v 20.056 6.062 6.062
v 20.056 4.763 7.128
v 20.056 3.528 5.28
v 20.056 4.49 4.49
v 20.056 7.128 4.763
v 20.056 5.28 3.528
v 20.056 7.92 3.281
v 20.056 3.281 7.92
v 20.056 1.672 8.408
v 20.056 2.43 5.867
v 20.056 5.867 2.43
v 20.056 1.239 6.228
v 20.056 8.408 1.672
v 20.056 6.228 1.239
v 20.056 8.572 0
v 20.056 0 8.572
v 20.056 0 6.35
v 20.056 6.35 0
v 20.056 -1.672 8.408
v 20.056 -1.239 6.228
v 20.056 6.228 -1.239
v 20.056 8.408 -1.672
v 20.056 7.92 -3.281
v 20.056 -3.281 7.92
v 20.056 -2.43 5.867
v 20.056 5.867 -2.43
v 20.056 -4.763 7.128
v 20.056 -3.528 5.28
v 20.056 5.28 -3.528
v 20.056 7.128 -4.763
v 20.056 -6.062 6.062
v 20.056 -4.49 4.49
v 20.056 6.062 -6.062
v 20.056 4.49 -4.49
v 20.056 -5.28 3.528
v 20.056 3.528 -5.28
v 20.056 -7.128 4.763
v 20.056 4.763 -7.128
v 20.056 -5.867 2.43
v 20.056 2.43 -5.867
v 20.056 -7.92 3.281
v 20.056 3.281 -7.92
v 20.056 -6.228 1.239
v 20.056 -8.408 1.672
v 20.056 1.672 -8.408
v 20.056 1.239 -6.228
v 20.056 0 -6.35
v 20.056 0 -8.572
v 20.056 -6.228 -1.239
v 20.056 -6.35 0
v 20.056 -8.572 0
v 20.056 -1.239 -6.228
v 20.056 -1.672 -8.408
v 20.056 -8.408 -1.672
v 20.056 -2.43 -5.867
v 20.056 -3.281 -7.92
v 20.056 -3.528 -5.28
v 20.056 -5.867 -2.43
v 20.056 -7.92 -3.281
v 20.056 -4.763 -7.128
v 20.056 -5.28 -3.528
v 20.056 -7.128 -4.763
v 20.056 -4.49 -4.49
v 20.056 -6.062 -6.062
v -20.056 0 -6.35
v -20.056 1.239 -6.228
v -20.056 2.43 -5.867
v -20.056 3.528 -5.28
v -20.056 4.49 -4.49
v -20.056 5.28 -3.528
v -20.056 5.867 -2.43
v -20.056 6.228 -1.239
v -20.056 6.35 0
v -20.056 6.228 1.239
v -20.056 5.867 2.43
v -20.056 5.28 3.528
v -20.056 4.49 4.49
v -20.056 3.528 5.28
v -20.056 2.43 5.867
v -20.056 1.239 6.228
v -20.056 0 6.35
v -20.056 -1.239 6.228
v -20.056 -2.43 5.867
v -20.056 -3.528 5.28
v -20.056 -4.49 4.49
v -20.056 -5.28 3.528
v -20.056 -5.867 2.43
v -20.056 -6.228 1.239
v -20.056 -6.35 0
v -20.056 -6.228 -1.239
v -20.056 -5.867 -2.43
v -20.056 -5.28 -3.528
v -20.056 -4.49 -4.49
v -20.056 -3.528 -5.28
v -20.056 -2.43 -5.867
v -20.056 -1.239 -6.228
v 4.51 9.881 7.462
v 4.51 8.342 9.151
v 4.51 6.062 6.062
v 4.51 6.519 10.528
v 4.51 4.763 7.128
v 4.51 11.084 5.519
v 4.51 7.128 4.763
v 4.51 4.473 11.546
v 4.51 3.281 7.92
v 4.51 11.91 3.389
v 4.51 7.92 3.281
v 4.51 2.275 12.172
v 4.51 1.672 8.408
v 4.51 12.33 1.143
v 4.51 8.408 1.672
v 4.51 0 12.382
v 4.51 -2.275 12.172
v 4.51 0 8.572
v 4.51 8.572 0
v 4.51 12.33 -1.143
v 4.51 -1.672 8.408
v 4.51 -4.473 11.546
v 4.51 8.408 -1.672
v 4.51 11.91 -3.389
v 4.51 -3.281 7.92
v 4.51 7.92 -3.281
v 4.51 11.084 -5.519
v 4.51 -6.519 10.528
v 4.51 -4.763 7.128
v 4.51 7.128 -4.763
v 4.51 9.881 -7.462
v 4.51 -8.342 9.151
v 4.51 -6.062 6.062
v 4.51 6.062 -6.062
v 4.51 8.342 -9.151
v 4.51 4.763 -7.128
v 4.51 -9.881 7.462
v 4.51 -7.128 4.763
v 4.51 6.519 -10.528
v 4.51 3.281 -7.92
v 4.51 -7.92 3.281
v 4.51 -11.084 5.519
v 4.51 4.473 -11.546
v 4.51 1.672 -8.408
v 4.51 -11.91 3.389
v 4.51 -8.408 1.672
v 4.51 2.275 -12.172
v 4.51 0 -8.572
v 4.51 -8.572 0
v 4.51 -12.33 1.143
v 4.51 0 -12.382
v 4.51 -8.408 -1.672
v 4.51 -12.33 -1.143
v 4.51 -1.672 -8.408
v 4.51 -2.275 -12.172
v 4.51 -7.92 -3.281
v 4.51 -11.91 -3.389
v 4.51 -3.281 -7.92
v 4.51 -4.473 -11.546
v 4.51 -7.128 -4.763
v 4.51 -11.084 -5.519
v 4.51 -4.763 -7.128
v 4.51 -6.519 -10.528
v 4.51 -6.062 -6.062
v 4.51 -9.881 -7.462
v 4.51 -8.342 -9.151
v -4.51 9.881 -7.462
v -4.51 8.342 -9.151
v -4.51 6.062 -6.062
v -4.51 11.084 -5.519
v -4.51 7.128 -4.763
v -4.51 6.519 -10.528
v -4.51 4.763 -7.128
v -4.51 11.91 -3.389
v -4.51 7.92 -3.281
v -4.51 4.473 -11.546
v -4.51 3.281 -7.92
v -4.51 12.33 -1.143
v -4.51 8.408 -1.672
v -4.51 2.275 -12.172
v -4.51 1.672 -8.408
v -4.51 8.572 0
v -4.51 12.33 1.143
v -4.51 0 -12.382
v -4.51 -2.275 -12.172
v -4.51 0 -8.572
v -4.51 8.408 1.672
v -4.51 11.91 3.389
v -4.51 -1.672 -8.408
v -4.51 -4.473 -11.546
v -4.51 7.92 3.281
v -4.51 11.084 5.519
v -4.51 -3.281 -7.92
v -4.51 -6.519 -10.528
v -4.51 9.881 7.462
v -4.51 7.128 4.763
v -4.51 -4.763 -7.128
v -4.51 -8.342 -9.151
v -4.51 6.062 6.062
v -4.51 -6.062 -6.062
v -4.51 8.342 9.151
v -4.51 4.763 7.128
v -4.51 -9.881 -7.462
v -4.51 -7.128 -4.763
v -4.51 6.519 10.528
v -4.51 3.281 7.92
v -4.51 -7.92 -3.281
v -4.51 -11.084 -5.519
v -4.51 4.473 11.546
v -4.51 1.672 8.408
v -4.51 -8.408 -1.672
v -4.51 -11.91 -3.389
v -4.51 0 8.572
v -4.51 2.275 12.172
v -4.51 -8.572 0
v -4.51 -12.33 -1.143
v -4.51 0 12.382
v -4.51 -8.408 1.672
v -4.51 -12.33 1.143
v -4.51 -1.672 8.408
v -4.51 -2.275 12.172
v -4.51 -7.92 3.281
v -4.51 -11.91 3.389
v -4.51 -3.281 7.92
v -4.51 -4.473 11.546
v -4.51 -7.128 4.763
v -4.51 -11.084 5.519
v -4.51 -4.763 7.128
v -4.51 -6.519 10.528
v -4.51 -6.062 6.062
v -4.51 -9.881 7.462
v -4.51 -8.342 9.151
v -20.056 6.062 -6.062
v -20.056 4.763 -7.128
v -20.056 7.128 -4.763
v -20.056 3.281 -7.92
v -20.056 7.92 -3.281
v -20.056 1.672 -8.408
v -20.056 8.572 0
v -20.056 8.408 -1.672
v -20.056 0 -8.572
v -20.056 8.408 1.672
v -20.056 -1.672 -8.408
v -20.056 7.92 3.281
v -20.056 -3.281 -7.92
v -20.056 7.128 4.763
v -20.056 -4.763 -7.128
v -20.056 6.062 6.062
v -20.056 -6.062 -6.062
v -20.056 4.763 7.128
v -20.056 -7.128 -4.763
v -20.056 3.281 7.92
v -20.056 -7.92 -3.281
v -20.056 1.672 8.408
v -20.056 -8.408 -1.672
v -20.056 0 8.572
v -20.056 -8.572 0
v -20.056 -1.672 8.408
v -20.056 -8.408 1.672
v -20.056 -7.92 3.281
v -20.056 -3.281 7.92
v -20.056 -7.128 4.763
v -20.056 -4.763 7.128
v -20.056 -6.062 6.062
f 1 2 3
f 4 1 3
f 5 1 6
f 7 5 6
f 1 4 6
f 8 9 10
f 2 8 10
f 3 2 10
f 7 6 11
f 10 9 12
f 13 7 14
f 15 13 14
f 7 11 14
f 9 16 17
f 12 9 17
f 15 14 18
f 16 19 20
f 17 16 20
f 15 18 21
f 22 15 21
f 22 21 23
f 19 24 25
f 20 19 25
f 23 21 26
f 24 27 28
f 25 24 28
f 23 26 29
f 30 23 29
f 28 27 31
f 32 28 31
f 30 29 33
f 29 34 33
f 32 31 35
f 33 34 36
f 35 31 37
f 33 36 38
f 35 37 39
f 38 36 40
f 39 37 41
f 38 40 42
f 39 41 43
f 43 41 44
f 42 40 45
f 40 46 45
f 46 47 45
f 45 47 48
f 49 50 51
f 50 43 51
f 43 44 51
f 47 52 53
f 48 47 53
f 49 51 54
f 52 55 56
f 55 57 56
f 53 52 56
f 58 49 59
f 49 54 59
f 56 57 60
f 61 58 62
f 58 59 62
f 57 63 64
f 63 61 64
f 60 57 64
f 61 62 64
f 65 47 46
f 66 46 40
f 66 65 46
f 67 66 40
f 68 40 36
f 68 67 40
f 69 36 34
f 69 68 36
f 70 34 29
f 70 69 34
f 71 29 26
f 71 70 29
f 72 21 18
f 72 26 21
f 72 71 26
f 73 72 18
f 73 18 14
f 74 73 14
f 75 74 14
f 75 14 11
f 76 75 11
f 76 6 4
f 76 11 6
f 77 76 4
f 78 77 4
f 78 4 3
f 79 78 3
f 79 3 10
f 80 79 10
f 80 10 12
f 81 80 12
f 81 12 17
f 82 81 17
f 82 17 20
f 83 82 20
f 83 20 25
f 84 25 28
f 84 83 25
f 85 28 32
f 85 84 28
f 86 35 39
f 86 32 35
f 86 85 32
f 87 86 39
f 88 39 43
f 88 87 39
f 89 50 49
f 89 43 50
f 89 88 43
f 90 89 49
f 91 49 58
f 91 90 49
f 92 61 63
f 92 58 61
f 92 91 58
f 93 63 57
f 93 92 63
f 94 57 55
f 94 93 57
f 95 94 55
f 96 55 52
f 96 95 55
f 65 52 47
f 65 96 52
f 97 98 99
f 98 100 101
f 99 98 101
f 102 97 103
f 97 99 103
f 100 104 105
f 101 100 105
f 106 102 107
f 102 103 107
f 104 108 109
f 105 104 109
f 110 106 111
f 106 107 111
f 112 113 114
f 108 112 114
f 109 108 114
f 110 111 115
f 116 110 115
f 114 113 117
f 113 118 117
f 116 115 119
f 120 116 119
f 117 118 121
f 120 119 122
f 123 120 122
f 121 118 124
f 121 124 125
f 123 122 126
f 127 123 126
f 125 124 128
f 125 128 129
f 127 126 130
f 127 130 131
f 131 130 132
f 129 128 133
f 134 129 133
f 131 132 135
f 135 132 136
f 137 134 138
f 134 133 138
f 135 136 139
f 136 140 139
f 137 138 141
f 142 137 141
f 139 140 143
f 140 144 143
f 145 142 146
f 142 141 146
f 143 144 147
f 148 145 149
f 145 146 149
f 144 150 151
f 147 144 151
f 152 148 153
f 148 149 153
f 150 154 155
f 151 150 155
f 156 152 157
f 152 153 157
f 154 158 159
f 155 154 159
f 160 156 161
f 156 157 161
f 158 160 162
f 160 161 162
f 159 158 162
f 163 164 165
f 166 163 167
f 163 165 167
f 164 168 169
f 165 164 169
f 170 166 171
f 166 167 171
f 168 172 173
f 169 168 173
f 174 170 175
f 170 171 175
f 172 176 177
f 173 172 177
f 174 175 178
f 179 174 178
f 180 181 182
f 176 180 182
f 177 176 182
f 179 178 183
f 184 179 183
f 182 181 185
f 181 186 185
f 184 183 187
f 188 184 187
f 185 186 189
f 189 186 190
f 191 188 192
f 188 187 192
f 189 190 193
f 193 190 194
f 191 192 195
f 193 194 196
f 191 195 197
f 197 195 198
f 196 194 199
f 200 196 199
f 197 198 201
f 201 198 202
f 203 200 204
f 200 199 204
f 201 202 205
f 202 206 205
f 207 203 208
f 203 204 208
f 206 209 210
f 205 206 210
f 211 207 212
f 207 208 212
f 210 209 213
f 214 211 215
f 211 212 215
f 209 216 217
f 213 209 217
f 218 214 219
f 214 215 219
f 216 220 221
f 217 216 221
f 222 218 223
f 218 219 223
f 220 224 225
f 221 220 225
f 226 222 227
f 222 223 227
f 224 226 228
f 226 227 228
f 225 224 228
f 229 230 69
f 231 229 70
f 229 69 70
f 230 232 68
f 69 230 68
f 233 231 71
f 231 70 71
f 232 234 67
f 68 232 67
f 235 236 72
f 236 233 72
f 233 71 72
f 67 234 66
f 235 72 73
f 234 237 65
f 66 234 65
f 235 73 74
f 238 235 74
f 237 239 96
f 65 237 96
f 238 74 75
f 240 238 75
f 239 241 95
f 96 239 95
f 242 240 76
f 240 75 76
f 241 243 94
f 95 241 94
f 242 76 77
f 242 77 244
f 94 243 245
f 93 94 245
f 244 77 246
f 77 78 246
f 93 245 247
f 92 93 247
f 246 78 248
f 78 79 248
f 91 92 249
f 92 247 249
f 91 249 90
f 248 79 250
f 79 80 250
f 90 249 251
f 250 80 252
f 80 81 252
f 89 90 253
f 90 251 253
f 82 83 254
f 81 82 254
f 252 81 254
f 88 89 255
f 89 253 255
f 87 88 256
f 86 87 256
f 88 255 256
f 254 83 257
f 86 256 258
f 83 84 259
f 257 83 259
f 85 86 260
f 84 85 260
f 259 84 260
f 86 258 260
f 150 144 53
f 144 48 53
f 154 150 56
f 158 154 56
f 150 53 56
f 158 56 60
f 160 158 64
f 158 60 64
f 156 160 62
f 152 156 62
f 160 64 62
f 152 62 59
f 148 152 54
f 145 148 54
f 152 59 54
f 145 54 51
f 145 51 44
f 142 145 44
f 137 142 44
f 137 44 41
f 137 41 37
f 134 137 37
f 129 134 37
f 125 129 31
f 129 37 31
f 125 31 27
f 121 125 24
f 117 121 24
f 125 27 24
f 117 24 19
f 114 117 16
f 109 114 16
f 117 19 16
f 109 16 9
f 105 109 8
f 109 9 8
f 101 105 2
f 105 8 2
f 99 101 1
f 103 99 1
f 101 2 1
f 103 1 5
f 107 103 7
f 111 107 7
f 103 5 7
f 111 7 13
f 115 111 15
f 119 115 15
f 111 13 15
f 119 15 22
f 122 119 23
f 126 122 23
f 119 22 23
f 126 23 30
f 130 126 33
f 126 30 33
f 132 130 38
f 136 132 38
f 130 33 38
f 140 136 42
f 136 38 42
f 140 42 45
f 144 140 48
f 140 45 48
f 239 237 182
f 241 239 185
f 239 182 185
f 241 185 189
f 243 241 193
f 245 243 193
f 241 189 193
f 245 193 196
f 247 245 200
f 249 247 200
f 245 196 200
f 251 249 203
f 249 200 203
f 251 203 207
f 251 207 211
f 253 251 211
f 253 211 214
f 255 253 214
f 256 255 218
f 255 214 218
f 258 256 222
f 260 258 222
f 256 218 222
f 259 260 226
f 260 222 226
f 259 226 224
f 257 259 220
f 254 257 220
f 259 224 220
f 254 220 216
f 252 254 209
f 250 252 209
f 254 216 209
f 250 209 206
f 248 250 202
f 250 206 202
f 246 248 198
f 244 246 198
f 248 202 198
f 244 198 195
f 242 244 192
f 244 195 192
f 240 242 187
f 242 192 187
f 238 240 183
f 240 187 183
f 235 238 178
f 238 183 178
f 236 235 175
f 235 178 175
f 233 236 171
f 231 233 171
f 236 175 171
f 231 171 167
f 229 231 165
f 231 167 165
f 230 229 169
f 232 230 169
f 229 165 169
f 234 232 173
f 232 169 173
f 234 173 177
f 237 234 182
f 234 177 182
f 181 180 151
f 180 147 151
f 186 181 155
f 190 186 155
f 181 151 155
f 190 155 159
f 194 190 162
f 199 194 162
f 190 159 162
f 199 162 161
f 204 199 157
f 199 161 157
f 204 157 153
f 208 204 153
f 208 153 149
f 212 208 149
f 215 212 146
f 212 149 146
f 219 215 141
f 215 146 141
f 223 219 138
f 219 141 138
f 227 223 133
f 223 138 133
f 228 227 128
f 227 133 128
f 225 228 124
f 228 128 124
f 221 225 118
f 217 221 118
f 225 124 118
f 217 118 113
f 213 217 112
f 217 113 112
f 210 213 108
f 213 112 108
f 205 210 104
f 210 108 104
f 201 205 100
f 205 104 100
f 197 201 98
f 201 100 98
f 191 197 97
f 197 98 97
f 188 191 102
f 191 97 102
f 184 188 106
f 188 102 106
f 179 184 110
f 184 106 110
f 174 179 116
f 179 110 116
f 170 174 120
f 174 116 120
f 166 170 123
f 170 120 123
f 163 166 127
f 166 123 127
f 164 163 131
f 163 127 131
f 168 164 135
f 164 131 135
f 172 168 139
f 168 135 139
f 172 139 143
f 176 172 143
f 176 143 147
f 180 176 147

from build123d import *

# Parameters (mm, degrees)
CUT_EXTRUDE1_DEPTH      = 44.767370257
CUT_EXTRUDE1_DEPTH_BACK = 44.767370257
SKETCH3_R               = 6.35


with BuildPart() as part:
    # Sketch2 → Revolve1 (revolve)
    with BuildSketch(Plane(origin=(0, 0, 0), x_dir=(1, 0, 0), z_dir=(0, 1, 0))):
        Polygon((-20.055735381, 8.5725), (-4.510240996, 8.5725), (-4.510240996, 12.3825), (4.510240996, 12.3825), (4.510240996, 8.5725), (20.055735381, 8.5725), (20.055735381, 0), (-20.055735381, 0), align=None)
    revolve(axis=Axis((20.055735381, 0, 0), (-1, 0, 0)))

    # Sketch3 → Cut-Extrude1 (cut, two sides: drawn at the far end of the back side and taken through both)
    with BuildSketch(Plane(origin=(20.055735381, 0, 0), x_dir=(0, 0, -1), z_dir=(1, 0, 0)).offset(-CUT_EXTRUDE1_DEPTH_BACK)):
        Circle(SKETCH3_R)
    extrude(amount=CUT_EXTRUDE1_DEPTH + CUT_EXTRUDE1_DEPTH_BACK, mode=Mode.SUBTRACT)


solid = part.part
